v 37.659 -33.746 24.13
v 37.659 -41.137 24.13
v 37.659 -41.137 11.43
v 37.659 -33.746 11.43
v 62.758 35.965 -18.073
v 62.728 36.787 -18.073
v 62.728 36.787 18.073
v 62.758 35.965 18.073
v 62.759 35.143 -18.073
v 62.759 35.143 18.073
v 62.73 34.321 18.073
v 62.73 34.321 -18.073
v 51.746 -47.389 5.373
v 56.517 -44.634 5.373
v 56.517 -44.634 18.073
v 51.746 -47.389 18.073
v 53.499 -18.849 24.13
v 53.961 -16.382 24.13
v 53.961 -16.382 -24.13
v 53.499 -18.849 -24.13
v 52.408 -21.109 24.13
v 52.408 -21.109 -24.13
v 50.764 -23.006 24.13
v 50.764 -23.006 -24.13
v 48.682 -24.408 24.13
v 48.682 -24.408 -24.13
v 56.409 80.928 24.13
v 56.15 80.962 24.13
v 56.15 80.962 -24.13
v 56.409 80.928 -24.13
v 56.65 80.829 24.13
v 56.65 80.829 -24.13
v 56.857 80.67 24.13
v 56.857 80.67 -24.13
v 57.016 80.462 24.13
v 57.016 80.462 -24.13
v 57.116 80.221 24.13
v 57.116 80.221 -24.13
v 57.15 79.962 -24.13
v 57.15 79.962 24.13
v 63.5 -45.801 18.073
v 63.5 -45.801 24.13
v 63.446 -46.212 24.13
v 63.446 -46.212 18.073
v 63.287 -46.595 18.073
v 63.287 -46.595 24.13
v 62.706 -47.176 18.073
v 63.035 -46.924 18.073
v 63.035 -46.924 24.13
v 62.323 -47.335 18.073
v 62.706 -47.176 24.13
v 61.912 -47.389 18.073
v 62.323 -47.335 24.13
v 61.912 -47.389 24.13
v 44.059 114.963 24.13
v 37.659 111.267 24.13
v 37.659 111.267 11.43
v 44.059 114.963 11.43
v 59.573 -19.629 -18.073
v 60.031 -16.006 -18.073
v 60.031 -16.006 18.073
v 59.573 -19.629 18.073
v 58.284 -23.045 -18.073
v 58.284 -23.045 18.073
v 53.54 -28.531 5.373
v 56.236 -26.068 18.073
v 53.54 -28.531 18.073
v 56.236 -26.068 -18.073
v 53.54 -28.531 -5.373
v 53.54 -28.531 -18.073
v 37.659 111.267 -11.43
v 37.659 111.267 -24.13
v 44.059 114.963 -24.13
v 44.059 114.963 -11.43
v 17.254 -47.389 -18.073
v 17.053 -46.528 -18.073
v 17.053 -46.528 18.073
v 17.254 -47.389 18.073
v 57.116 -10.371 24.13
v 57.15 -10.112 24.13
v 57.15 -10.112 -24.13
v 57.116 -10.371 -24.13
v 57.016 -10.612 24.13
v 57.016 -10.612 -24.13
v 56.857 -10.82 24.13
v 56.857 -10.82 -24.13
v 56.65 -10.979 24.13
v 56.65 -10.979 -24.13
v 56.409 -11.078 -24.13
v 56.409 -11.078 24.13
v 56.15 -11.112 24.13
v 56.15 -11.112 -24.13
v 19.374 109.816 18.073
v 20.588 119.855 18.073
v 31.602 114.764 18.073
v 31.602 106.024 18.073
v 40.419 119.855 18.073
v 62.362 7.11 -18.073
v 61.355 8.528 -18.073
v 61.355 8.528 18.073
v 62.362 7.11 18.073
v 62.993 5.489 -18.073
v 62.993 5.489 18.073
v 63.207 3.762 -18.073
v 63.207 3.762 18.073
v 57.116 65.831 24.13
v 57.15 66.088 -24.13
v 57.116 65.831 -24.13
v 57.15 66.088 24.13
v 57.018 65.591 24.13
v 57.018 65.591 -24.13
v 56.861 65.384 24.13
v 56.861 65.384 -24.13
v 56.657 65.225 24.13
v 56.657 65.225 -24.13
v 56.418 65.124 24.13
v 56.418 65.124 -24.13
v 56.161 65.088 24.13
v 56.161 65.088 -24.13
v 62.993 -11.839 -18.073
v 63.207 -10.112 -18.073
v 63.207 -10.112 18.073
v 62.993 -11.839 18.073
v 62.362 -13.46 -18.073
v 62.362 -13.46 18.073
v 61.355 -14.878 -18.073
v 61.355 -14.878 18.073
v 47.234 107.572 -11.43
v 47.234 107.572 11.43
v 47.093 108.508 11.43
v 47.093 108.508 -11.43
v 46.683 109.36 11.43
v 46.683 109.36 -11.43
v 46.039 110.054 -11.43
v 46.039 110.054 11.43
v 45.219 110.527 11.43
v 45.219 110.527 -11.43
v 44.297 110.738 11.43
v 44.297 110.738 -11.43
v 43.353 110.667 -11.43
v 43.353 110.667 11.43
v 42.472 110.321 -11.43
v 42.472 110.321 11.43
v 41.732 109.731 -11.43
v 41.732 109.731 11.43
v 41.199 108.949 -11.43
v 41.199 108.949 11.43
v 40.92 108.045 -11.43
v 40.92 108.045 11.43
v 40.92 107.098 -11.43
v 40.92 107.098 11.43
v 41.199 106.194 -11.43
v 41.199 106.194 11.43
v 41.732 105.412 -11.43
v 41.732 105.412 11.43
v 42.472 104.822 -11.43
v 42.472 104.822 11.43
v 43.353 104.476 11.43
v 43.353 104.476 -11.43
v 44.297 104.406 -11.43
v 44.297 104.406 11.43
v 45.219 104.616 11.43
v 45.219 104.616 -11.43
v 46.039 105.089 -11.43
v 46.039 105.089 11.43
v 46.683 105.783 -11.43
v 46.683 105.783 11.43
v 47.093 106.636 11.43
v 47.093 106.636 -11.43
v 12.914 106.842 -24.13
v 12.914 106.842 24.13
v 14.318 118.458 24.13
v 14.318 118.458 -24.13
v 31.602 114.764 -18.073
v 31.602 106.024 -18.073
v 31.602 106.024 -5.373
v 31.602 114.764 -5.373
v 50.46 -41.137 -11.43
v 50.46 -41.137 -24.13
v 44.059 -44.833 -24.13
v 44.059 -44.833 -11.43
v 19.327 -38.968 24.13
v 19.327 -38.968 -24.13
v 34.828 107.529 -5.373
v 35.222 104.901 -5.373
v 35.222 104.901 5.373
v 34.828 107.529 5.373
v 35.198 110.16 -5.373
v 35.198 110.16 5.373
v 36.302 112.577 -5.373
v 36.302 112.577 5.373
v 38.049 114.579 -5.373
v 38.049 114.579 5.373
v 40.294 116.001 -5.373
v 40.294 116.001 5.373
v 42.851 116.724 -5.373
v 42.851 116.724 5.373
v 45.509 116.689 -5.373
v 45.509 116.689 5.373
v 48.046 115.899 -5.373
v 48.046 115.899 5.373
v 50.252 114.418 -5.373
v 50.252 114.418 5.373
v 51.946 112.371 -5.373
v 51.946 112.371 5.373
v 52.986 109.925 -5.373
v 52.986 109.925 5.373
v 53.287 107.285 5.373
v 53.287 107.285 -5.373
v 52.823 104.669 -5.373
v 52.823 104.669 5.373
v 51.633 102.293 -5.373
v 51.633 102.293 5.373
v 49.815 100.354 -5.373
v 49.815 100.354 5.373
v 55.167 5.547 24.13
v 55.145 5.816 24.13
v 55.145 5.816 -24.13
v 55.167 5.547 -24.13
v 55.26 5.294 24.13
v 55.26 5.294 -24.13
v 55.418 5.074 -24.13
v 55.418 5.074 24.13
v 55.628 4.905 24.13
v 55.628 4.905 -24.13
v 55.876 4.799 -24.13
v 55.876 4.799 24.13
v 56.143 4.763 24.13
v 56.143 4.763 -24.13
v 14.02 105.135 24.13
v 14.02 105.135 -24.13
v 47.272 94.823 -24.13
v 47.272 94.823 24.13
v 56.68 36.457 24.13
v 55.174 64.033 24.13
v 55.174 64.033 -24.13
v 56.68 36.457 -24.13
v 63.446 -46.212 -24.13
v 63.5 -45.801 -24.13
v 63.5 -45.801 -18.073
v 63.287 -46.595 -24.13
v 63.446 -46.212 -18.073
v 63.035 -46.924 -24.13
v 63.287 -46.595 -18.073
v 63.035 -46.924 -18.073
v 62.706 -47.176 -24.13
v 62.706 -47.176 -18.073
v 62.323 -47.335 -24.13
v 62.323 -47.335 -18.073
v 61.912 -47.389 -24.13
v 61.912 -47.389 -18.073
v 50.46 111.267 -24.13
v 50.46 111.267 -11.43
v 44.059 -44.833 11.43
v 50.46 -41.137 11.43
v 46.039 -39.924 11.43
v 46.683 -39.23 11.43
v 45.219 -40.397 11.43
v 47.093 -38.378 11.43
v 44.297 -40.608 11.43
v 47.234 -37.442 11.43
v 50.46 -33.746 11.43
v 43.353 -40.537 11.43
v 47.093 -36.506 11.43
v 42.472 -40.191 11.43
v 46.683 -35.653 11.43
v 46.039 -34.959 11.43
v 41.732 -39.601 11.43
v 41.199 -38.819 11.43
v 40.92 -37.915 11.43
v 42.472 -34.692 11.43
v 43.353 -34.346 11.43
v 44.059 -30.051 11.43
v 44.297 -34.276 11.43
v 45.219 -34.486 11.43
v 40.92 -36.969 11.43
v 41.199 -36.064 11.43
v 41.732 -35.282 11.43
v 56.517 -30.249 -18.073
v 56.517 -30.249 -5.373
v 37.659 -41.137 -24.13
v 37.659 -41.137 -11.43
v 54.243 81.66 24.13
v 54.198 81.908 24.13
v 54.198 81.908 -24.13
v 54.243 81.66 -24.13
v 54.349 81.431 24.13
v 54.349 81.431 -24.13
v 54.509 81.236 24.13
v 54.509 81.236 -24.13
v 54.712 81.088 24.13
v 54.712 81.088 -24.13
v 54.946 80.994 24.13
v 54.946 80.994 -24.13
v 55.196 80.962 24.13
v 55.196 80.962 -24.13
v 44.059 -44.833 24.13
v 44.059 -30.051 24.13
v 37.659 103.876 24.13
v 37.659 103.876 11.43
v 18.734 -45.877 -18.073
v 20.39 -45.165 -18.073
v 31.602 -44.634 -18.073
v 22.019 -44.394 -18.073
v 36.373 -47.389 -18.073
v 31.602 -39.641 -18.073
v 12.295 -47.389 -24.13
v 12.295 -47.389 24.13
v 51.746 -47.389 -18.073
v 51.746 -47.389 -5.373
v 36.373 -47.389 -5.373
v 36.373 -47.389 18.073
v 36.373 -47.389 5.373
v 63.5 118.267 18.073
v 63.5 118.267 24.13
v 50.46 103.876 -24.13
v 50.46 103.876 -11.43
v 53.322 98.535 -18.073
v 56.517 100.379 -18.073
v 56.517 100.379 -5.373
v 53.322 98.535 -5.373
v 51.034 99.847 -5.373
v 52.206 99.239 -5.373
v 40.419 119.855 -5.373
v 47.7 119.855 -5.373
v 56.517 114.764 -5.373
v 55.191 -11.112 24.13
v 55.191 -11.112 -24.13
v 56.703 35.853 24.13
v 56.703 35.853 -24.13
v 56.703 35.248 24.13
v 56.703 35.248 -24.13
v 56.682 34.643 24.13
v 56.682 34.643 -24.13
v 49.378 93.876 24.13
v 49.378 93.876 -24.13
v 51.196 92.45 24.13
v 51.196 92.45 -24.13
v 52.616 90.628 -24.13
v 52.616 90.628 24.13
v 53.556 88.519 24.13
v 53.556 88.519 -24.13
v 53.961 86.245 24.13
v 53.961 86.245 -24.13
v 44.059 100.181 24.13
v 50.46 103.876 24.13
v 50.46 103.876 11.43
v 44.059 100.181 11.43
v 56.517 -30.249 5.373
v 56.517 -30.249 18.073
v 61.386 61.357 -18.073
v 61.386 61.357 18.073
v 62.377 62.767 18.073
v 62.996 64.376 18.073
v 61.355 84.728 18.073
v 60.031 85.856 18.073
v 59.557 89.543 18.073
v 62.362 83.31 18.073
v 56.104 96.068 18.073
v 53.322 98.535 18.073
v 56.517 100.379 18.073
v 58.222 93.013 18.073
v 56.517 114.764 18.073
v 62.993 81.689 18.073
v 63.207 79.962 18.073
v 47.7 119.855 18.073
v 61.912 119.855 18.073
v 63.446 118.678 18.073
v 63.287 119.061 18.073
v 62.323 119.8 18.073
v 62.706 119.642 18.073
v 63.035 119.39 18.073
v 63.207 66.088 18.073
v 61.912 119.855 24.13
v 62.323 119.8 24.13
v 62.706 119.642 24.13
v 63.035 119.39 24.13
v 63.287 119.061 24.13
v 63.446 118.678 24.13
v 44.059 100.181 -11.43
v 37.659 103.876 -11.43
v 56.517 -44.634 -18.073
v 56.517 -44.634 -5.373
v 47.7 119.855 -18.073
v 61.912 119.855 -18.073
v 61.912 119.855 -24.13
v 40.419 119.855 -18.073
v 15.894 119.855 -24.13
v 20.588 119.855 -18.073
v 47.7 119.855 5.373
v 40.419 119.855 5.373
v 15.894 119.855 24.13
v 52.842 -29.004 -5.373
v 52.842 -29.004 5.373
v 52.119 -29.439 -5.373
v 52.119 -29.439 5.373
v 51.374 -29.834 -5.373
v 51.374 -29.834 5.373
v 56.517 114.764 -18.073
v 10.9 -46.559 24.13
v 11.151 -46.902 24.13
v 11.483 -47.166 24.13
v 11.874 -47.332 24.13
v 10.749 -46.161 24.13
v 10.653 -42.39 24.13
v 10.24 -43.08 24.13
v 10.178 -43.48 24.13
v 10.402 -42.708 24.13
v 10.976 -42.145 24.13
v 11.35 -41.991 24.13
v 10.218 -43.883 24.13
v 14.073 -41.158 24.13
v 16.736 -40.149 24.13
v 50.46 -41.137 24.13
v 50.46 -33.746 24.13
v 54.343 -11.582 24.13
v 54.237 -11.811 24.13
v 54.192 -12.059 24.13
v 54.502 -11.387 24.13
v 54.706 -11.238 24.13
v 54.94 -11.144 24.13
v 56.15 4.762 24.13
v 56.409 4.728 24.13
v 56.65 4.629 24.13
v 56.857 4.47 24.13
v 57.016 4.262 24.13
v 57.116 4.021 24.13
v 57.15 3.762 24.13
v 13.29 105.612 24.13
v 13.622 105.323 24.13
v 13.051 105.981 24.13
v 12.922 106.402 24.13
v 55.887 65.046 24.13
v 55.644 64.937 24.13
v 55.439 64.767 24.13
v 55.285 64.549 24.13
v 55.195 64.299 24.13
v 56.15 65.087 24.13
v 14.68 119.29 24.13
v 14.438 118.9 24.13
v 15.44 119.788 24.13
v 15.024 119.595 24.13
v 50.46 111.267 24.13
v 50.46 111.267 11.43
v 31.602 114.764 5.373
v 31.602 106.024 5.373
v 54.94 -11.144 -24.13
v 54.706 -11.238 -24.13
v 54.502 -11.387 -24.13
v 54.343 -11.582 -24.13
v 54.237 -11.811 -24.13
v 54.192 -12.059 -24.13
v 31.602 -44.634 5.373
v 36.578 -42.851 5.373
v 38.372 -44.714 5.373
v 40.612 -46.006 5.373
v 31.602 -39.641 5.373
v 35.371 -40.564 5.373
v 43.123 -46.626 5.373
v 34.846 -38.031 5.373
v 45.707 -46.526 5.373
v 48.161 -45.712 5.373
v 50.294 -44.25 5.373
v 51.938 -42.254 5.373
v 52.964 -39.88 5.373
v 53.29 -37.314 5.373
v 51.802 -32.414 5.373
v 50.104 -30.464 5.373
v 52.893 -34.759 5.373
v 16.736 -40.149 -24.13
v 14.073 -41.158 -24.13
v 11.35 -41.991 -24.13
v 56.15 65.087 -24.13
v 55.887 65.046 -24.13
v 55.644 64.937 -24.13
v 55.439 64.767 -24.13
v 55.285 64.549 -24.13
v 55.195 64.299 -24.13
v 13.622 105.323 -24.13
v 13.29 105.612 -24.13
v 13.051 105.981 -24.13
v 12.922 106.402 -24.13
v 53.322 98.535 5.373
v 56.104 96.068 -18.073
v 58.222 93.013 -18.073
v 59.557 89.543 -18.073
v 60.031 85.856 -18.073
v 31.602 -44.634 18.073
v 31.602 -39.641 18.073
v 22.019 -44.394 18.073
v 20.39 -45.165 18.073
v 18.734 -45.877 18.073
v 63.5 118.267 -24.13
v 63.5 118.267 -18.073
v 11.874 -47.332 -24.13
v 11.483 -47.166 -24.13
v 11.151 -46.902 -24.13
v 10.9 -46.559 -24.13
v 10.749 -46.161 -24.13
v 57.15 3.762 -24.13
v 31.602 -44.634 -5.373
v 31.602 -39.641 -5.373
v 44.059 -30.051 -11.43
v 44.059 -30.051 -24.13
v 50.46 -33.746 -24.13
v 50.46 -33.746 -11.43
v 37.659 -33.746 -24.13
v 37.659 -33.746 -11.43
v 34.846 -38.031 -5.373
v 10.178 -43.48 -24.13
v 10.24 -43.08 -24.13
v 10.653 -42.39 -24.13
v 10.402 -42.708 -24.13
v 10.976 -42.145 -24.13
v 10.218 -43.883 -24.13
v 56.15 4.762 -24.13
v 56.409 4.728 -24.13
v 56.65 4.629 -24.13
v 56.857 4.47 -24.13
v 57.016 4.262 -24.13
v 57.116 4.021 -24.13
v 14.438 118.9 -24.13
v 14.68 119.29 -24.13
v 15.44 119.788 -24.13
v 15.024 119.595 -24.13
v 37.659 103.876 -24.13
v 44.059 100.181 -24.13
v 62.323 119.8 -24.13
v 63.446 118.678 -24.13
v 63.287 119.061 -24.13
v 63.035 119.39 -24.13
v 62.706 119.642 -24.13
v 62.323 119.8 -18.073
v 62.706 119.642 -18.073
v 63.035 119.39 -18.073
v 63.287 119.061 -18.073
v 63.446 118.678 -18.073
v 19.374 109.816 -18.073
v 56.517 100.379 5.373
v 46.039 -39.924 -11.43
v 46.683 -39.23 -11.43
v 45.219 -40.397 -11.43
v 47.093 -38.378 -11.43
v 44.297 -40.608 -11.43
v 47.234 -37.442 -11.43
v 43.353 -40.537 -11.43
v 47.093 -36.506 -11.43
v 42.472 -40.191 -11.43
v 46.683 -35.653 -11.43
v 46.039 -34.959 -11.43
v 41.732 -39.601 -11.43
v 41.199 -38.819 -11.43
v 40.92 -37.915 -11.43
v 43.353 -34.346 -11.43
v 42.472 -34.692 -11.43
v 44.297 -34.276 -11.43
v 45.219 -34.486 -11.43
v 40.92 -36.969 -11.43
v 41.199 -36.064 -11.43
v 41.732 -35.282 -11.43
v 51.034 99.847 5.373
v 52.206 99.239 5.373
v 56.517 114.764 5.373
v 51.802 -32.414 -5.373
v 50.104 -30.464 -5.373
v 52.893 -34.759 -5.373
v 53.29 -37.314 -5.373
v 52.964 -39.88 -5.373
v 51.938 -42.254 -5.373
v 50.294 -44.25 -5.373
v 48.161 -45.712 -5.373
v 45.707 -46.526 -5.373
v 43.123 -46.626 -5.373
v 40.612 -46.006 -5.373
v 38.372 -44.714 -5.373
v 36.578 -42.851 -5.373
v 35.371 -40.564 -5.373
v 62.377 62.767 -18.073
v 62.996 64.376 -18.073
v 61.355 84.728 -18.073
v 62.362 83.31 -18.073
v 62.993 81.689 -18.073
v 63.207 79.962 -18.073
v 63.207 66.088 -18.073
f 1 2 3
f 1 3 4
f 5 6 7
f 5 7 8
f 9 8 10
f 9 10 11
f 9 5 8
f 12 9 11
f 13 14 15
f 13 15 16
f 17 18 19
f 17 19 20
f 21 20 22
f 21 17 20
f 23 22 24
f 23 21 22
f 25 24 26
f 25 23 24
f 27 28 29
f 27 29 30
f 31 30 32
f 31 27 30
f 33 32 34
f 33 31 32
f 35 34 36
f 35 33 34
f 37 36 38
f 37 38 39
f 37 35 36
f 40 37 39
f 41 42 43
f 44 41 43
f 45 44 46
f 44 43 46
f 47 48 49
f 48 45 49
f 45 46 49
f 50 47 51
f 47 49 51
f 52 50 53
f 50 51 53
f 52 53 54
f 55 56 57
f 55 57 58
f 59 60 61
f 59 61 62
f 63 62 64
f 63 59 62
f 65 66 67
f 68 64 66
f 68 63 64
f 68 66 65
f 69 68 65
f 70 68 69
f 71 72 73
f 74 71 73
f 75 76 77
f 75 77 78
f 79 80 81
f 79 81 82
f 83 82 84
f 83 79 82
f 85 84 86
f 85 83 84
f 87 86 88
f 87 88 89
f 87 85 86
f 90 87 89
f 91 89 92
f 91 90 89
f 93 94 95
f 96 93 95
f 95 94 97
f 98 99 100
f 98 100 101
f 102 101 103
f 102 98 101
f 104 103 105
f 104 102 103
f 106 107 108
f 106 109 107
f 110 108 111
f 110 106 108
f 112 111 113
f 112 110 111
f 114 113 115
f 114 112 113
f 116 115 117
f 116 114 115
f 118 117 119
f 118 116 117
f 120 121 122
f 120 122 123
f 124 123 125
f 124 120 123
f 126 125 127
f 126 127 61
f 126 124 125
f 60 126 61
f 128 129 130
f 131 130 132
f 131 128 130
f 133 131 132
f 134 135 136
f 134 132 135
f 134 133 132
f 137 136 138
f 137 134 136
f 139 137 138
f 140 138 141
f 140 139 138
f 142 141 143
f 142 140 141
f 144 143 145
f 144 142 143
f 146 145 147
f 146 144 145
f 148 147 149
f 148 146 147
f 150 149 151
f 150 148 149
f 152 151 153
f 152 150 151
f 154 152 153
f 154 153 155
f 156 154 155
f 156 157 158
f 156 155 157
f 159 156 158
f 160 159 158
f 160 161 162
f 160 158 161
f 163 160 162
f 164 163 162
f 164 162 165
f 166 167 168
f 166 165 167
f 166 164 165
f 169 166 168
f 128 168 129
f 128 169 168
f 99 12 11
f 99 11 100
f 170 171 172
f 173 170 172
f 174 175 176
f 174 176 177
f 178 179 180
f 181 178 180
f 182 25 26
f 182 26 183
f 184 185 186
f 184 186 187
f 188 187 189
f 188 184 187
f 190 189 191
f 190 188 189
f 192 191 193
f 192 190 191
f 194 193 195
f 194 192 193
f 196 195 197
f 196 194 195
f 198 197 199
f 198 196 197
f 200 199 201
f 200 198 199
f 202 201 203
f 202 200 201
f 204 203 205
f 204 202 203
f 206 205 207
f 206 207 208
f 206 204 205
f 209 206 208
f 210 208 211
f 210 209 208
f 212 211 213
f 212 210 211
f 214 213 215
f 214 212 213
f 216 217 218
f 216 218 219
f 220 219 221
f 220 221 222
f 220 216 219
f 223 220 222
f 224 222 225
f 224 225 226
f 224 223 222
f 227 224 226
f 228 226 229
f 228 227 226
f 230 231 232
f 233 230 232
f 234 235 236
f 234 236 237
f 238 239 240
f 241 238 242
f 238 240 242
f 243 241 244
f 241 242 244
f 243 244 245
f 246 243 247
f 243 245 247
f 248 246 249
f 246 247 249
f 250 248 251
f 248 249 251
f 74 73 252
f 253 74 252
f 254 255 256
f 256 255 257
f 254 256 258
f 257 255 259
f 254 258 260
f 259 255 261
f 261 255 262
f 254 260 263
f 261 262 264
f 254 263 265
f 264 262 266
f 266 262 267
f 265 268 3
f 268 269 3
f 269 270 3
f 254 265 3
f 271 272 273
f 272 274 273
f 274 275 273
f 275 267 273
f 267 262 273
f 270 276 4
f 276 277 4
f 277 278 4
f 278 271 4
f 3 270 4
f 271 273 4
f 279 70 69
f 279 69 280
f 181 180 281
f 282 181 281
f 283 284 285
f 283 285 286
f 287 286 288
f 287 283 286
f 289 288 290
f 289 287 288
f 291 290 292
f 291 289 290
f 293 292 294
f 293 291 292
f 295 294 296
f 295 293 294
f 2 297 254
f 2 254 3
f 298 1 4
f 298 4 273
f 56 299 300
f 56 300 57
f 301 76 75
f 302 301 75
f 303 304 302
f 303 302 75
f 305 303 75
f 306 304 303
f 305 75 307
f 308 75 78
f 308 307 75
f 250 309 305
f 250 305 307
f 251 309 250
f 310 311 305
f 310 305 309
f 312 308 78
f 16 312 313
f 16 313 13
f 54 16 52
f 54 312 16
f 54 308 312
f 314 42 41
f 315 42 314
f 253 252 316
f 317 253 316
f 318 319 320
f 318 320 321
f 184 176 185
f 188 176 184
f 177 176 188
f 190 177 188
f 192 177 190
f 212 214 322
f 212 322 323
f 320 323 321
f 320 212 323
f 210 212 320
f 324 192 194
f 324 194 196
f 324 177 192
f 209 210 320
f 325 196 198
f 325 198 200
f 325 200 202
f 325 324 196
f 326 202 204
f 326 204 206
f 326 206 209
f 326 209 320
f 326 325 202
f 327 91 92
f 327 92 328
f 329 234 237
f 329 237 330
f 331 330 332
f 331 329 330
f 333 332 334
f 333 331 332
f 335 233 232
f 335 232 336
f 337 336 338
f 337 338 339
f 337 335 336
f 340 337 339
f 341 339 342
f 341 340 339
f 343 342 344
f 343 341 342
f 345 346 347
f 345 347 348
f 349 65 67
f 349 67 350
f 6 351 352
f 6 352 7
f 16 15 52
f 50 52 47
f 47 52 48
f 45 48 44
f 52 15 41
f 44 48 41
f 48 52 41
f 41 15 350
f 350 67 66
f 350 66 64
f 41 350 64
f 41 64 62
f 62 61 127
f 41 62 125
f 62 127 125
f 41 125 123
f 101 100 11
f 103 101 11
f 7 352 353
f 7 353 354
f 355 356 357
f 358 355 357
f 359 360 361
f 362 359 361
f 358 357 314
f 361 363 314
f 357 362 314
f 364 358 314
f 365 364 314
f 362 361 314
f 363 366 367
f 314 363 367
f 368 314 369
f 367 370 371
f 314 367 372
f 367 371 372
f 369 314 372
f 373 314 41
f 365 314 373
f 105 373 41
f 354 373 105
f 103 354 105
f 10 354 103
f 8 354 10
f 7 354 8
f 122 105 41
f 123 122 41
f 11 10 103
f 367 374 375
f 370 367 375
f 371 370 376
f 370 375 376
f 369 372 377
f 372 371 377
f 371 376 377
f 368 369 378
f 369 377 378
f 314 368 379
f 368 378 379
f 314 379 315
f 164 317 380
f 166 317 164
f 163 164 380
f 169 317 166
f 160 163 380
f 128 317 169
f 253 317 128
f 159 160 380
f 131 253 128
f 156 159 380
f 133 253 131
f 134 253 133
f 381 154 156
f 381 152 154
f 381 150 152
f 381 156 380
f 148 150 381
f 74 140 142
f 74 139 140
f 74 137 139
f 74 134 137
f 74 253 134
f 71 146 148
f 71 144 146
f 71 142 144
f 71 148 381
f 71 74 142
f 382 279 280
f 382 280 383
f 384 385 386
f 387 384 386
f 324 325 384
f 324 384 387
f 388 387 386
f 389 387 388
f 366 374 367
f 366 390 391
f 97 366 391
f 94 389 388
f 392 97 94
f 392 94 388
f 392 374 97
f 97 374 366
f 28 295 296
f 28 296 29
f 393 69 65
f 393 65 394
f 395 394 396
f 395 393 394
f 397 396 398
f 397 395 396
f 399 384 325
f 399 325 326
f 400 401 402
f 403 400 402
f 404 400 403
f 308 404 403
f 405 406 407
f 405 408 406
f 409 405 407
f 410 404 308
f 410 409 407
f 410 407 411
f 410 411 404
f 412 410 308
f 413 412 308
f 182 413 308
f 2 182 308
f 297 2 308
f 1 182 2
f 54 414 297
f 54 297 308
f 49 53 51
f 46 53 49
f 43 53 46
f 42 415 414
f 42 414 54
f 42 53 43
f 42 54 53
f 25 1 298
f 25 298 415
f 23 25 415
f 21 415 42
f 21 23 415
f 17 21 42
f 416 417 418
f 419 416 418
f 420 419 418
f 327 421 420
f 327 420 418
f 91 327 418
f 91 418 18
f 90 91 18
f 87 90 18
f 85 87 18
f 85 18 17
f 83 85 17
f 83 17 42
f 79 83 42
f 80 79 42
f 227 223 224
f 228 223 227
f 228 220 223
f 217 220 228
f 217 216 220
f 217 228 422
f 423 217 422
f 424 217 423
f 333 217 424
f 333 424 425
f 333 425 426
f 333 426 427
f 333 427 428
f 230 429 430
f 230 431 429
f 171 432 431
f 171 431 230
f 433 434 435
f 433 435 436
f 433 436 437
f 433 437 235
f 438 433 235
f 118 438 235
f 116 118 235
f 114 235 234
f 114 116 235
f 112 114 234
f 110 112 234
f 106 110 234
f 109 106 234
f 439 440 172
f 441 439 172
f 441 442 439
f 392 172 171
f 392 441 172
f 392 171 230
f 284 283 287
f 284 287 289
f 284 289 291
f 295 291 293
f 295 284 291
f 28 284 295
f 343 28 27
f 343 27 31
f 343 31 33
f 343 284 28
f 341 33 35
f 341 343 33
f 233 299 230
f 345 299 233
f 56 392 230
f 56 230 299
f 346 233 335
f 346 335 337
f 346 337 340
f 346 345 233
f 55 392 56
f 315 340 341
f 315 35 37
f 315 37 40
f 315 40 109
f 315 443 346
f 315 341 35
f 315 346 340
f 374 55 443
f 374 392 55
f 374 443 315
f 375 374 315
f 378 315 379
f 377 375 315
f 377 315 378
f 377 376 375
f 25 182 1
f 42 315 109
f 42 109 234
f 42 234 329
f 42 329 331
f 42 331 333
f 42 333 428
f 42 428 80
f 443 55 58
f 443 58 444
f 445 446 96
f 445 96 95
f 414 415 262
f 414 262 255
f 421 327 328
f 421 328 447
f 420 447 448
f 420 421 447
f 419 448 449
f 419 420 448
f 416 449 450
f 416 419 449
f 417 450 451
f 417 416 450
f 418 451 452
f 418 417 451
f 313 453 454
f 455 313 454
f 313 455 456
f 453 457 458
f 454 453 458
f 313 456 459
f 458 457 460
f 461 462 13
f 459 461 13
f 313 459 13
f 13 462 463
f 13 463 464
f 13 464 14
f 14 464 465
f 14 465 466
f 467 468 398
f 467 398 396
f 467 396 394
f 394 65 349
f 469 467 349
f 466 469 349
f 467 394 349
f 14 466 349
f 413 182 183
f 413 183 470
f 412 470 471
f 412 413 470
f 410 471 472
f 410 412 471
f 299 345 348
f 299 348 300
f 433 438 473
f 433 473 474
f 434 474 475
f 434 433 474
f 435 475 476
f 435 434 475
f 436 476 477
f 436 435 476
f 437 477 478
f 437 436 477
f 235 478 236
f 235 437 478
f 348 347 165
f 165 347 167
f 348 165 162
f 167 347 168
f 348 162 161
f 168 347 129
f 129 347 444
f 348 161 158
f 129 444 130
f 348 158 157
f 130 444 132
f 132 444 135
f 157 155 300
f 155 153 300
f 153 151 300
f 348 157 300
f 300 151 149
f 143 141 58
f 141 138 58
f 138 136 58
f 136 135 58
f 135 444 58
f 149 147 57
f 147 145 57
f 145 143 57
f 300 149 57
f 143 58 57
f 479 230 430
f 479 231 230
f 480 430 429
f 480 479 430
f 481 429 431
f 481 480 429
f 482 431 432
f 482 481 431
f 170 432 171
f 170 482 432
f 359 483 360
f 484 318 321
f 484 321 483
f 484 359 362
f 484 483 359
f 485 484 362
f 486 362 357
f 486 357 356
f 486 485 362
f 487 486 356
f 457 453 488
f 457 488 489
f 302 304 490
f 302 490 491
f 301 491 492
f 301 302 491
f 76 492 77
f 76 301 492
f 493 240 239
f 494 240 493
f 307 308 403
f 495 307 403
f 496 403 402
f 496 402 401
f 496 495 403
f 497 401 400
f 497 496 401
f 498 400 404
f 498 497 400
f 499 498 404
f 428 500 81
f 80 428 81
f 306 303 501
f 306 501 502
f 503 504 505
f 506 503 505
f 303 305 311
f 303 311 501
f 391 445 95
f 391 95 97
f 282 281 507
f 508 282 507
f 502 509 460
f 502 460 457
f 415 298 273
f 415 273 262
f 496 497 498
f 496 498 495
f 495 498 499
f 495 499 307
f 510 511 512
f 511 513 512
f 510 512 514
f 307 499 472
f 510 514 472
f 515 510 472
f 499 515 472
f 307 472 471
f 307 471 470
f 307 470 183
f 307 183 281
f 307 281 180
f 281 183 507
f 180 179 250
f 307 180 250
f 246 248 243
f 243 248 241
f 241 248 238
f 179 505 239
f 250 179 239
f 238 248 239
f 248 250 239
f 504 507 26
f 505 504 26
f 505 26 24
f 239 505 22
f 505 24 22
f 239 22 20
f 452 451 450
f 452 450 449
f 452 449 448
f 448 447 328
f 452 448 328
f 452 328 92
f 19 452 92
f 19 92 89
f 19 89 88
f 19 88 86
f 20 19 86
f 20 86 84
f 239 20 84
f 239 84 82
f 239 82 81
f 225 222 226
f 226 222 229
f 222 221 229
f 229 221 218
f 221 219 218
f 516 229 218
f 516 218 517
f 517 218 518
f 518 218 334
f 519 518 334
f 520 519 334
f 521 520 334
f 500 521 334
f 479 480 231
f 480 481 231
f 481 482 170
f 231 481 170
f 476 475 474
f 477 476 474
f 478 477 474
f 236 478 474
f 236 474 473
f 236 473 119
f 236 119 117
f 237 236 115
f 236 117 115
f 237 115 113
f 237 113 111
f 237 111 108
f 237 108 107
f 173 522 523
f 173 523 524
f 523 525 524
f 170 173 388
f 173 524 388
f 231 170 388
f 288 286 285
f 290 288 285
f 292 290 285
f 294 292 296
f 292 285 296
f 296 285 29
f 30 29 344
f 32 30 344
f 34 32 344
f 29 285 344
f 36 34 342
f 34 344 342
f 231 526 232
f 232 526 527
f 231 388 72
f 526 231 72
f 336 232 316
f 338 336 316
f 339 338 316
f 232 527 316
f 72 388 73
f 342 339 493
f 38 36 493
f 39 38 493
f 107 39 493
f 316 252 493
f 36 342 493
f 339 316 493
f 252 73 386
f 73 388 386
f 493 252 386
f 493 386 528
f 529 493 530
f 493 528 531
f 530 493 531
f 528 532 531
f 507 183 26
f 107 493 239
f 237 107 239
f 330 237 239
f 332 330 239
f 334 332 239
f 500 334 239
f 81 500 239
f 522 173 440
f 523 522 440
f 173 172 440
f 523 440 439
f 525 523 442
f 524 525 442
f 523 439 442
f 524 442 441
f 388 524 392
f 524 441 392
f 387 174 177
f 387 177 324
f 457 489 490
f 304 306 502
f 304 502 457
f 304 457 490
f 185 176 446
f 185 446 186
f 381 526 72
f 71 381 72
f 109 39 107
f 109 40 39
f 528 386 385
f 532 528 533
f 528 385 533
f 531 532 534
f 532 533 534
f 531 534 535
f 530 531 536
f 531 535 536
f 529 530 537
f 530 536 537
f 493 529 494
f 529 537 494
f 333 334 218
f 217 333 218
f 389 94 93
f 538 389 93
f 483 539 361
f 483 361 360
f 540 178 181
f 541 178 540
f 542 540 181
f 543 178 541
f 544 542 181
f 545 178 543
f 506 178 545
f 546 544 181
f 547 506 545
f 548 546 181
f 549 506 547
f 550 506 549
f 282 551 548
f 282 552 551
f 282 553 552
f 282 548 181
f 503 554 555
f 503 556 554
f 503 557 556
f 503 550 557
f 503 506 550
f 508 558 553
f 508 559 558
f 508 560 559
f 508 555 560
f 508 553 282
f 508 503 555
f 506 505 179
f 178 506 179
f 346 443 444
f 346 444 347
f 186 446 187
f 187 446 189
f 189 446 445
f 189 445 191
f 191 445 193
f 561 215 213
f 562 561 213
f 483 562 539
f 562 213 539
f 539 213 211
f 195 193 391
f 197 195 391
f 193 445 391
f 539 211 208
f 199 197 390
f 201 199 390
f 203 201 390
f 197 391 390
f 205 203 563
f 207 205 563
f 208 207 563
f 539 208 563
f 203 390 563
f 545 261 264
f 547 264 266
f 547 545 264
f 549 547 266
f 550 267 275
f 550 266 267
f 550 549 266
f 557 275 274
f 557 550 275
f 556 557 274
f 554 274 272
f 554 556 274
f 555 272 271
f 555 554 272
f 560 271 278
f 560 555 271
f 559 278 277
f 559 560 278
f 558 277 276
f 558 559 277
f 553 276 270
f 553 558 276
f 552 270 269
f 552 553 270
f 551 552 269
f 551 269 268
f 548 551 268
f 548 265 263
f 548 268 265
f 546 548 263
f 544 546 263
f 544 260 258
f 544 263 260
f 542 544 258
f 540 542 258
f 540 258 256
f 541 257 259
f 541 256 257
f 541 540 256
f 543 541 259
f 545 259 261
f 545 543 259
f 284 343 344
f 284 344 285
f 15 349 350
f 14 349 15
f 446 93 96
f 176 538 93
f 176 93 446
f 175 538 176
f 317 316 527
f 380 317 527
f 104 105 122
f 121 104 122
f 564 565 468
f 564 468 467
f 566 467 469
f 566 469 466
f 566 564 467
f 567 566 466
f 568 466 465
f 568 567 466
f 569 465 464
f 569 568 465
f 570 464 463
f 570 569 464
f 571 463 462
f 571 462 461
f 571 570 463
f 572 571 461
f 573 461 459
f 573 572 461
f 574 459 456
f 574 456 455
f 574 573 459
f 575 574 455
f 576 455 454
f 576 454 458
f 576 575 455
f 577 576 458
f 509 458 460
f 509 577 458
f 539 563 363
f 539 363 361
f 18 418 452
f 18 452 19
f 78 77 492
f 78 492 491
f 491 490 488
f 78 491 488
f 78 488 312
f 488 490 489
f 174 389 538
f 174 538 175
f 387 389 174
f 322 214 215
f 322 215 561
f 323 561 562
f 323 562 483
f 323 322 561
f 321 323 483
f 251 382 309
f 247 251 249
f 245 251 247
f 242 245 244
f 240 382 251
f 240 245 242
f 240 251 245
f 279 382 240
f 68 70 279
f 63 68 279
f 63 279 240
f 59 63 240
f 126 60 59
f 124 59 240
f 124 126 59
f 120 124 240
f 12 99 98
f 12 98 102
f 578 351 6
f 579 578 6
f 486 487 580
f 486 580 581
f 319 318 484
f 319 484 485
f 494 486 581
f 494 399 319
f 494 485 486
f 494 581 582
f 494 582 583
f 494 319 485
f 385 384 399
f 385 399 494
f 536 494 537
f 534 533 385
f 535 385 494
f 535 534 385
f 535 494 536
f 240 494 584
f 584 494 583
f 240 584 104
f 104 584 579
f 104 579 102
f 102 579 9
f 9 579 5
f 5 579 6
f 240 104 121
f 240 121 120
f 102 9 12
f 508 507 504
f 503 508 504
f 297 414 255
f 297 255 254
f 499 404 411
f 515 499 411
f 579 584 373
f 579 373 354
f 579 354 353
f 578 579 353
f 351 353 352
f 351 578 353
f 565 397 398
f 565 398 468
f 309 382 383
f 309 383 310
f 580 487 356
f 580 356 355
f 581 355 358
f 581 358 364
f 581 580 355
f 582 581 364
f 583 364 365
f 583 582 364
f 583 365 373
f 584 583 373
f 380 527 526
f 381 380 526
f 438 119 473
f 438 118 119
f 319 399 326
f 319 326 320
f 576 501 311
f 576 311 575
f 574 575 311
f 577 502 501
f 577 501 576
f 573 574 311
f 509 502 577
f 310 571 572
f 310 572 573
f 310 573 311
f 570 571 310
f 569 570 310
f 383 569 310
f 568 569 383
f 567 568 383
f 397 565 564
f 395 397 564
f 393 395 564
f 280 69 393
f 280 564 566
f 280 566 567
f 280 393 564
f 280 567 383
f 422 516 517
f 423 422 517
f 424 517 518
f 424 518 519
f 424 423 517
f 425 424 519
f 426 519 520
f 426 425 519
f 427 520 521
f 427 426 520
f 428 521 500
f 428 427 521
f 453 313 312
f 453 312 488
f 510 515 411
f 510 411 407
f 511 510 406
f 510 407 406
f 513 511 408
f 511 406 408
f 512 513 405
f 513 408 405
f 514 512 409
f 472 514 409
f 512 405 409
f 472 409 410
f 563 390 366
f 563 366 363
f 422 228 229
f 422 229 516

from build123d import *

# Parameters (mm, degrees)
BOSS_EXTRUDE1_DEPTH     = 24.13
CUT_EXTRUDE1_DEPTH      = 138.766550514
CUT_EXTRUDE1_DEPTH_BACK = 138.766550514
FILLET1_R               = 1.5875
CUT_EXTRUDE2_DEPTH      = 12.7
CUT_EXTRUDE3_DEPTH      = 138.766550514
CUT_EXTRUDE3_DEPTH_BACK = 138.766550514
SKETCH4_R               = 3.175
SHELL1_START            = -18.073116
SHELL1_DEPTH            = 36.146232
SHELL1_START_2          = -5.373116
SHELL1_2_DEPTH          = 10.746232


# Read off the part's stored shape, not the designer's step: Shell1
with BuildPart() as part:
    # Sketch1 → Boss-Extrude1 (new, symmetric)
    with BuildSketch(Plane.XY):
        with BuildLine():
            Line((56.161313585, 65.087564001), (56.15, 65.087371974))
            ThreePointArc((56.15, 65.087371974), (55.438759683, 64.766920639), (55.174115771, 64.033084522))
            Line((55.174115771, 64.033084522), (56.680450554, 36.457041128))
            ThreePointArc((56.680450554, 36.457041128), (56.705496383, 35.550244887), (56.681639728, 34.643416582))
            Line((56.681639728, 34.643416582), (55.144848554, 5.815734008))
            ThreePointArc((55.144848554, 5.815734008), (55.417746823, 5.074471658), (56.143430652, 4.7625))
            Line((56.143430652, 4.7625), (56.149999968, 4.762499984))
            ThreePointArc((56.149999968, 4.762499984), (56.857106771, 4.469606766), (57.15, 3.762499968))
            Line((57.15, 3.762499968), (57.15, -10.112499968))
            ThreePointArc((57.15, -10.112499968), (56.857106771, -10.819606766), (56.149999968, -11.112499984))
            Line((56.149999968, -11.112499984), (55.190522202, -11.1125))
            ThreePointArc((55.190522202, -11.1125), (54.502493828, -11.386816202), (54.191940103, -12.059266056))
            Line((54.191940103, -12.059266056), (53.961494186, -16.382053603))
            ThreePointArc((53.961494186, -16.382053603), (52.407837698, -21.109352316), (48.682296217, -24.408070592))
            Line((48.682296217, -24.408070592), (19.327486058, -38.967689038))
            ThreePointArc((19.327486058, -38.967689038), (0, -43.4975), (-19.327486058, -38.967689038))
            Line((-19.327486058, -38.967689038), (-19.327486058, -47.388950103))
            Line((-19.327486058, -47.388950103), (63.5, -47.388950103))
            Line((63.5, -47.388950103), (63.5, 119.854559949))
            Line((63.5, 119.854559949), (-4.702524006, 119.854559949))
            Line((-4.702524006, 119.854559949), (-4.702524006, 108.02491605))
            ThreePointArc((-4.702524006, 108.02491605), (0, 108.7374), (4.702524006, 108.02491605))
            Line((4.702524006, 108.02491605), (47.271514403, 94.82250963))
            ThreePointArc((47.271514403, 94.82250963), (51.961130003, 91.582350175), (53.960821068, 86.244526329))
            Line((53.960821068, 86.244526329), (54.197705155, 81.907956584))
            ThreePointArc((54.197705155, 81.907956584), (54.508664182, 81.236365226), (55.196216585, 80.9625))
            Line((55.196216585, 80.9625), (56.149999984, 80.962499984))
            ThreePointArc((56.149999984, 80.962499984), (56.857106777, 80.669606761), (57.15, 79.962499968))
            Line((57.15, 79.962499968), (57.15, 66.087500032))
            ThreePointArc((57.15, 66.087500032), (56.8610955, 65.384404568), (56.161313585, 65.087564001))
        make_face()
    extrude(amount=BOSS_EXTRUDE1_DEPTH, both=True)

    # Sketch2 → Cut-Extrude1 (cut, two sides: drawn at the far end of the back side and taken through both)
    with BuildSketch(Plane.XY.offset(-CUT_EXTRUDE1_DEPTH_BACK)):
        Polygon((0, 0), (16.649604997, 137.747881839), (-33.336773011, 132.313158031), (-32.126746787, -67.704176811), (15.765326083, -67.704176811), align=None)
    extrude(amount=CUT_EXTRUDE1_DEPTH + CUT_EXTRUDE1_DEPTH_BACK, mode=Mode.SUBTRACT)

    # Fillet1
    fillet1_edges = [part.edges().sort_by_distance(p)[0] for p in [
        (63.5, 119.854559949, 0),
        (63.5, -47.388950103, 0),
        (11.034802966, -47.388950103, 0),
        (9.864742858, -42.364128158, 0),
        (12.755119811, 105.527472687, 0),
        (14.486836775, 119.854559949, 0),
    ]]
    fillet(fillet1_edges, radius=FILLET1_R)

    # Sketch3 → Cut-Extrude2 (cut)
    with BuildSketch(Plane(origin=(0, 0, -24.13), x_dir=(-1, 0, 0), z_dir=(0, 0, -1))):
        Polygon((-44.059380862, -30.050777043), (-50.460180862, -33.746280646), (-50.460180862, -41.137287852), (-44.059380862, -44.832791455), (-37.658580862, -41.137287852), (-37.658580862, -33.746280646), align=None)
        Polygon((-37.658580862, 111.2671939), (-44.059380862, 114.962697503), (-50.460180862, 111.2671939), (-50.460180862, 103.876186694), (-44.059380862, 100.180683091), (-37.658580862, 103.876186694), align=None)
    cut_extrude2 = extrude(amount=-CUT_EXTRUDE2_DEPTH, mode=Mode.SUBTRACT)

    # Mirror1: Cut-Extrude2 across plane
    add(cut_extrude2.mirror(Plane.XY), mode=Mode.SUBTRACT)

    # Sketch4 → Cut-Extrude3 (cut, two sides: drawn at the far end of the back side and taken through both)
    with BuildSketch(Plane.XY.offset(-CUT_EXTRUDE3_DEPTH_BACK)):
        with Locations((44.059380862, 107.571690297)):
            Circle(SKETCH4_R)
        with Locations((44.059380862, -37.441784249)):
            Circle(SKETCH4_R)
    extrude(amount=CUT_EXTRUDE3_DEPTH + CUT_EXTRUDE3_DEPTH_BACK, mode=Mode.SUBTRACT)

    # Shell1 outline → Shell1 (cut)
    with BuildSketch(Plane.XY.offset(SHELL1_START)):
        with BuildLine():
            ThreePointArc((60.031332227, -16.006129752), (58.284234513, -23.045011467), (53.540141007, -28.530609249))
            Line((53.540141007, -28.530609249), (56.517064862, -30.249337038))
            Line((56.517064862, -30.249337038), (56.517064862, -44.63423146))
            Line((56.517064862, -44.63423146), (51.745752212, -47.388950103))
            Line((51.745752212, -47.388950103), (61.9125, -47.388950103))
            ThreePointArc((61.9125, -47.388950103), (63.035032015, -46.923982118), (63.5, -45.801450103))
            Line((63.5, -45.801450103), (63.5, 118.267059949))
            ThreePointArc((63.5, 118.267059949), (63.035032015, 119.389591964), (61.9125, 119.854559949))
            Line((61.9125, 119.854559949), (47.700194563, 119.854559949))
            Line((47.700194563, 119.854559949), (56.517064862, 114.764137508))
            Line((56.517064862, 114.764137508), (56.517064862, 100.379243086))
            Line((56.517064862, 100.379243086), (53.321926303, 98.534528979))
            ThreePointArc((53.321926303, 98.534528979), (58.222287934, 93.013291574), (60.031332227, 85.856129752))
            ThreePointArc((60.031332227, 85.856129752), (62.362476281, 83.309849707), (63.206884, 79.962499968))
            Line((63.206884, 79.962499968), (63.206884008, 66.087500032))
            ThreePointArc((63.206884008, 66.087500032), (62.736011515, 63.552926254), (61.386232226, 61.356592716))
            Line((61.386232226, 61.356592716), (62.728318266, 36.787404457))
            ThreePointArc((62.728318266, 36.787404457), (62.762379081, 35.55421632), (62.729935471, 34.320984576))
            Line((62.729935471, 34.320984576), (61.354914269, 8.527841436))
            ThreePointArc((61.354914269, 8.527841436), (62.727616894, 6.318780038), (63.206884, 3.762499968))
            Line((63.206884, 3.762499968), (63.206884, -10.112499968))
            ThreePointArc((63.206884, -10.112499968), (62.362476281, -13.459849707), (60.031332227, -16.006129752))
        make_face()
        with BuildLine():
            Line((31.601696862, -44.63423146), (31.601696862, -39.640802436))
            Line((31.601696862, -39.640802436), (22.018775007, -44.39381174))
            ThreePointArc((22.018775007, -44.39381174), (19.565089882, -45.528499114), (17.053178169, -46.527691625))
            Line((17.053178169, -46.527691625), (17.253727402, -47.388950103))
            Line((17.253727402, -47.388950103), (36.373009512, -47.388950103))
            Line((36.373009512, -47.388950103), (31.601696862, -44.63423146))
        make_face()
        Polygon((31.601696862, 114.764137508), (40.418567161, 119.854559949), (20.587804641, 119.854559949), (19.374447508, 109.816041015), (31.601696862, 106.023864741), align=None)
    extrude(amount=SHELL1_DEPTH, mode=Mode.SUBTRACT)

    # Shell1 2 outline → Shell1 2 (cut)
    with BuildSketch(Plane.XY.offset(SHELL1_START_2)):
        with BuildLine():
            ThreePointArc((53.540141007, -28.530609249), (52.483348575, -29.226420137), (51.373585166, -29.834193295))
            Line((51.373585166, -29.834193295), (50.103961944, -30.463910523))
            ThreePointArc((50.103961944, -30.463910523), (48.161435217, -45.712263816), (34.846350755, -38.031494714))
            Line((34.846350755, -38.031494714), (31.601696862, -39.640802436))
            Line((31.601696862, -39.640802436), (31.601696862, -44.63423146))
            Line((31.601696862, -44.63423146), (36.373009512, -47.388950103))
            Line((36.373009512, -47.388950103), (51.745752212, -47.388950103))
            Line((51.745752212, -47.388950103), (56.517064862, -44.63423146))
            Line((56.517064862, -44.63423146), (56.517064862, -30.249337038))
            Line((56.517064862, -30.249337038), (53.540141007, -28.530609249))
        make_face()
        with BuildLine():
            Line((56.517064862, 114.764137508), (47.700194563, 119.854559949))
            Line((47.700194563, 119.854559949), (40.418567161, 119.854559949))
            Line((40.418567161, 119.854559949), (31.601696862, 114.764137508))
            Line((31.601696862, 114.764137508), (31.601696862, 106.023864741))
            Line((31.601696862, 106.023864741), (35.222242894, 104.900983514))
            ThreePointArc((35.222242894, 104.900983514), (46.805661297, 116.385635269), (49.81545048, 100.353979805))
            ThreePointArc((49.81545048, 100.353979805), (51.626581689, 99.555827316), (53.321926303, 98.534528979))
            Line((53.321926303, 98.534528979), (56.517064862, 100.379243086))
            Line((56.517064862, 100.379243086), (56.517064862, 114.764137508))
        make_face()
    extrude(amount=SHELL1_2_DEPTH, mode=Mode.SUBTRACT)


solid = part.part
